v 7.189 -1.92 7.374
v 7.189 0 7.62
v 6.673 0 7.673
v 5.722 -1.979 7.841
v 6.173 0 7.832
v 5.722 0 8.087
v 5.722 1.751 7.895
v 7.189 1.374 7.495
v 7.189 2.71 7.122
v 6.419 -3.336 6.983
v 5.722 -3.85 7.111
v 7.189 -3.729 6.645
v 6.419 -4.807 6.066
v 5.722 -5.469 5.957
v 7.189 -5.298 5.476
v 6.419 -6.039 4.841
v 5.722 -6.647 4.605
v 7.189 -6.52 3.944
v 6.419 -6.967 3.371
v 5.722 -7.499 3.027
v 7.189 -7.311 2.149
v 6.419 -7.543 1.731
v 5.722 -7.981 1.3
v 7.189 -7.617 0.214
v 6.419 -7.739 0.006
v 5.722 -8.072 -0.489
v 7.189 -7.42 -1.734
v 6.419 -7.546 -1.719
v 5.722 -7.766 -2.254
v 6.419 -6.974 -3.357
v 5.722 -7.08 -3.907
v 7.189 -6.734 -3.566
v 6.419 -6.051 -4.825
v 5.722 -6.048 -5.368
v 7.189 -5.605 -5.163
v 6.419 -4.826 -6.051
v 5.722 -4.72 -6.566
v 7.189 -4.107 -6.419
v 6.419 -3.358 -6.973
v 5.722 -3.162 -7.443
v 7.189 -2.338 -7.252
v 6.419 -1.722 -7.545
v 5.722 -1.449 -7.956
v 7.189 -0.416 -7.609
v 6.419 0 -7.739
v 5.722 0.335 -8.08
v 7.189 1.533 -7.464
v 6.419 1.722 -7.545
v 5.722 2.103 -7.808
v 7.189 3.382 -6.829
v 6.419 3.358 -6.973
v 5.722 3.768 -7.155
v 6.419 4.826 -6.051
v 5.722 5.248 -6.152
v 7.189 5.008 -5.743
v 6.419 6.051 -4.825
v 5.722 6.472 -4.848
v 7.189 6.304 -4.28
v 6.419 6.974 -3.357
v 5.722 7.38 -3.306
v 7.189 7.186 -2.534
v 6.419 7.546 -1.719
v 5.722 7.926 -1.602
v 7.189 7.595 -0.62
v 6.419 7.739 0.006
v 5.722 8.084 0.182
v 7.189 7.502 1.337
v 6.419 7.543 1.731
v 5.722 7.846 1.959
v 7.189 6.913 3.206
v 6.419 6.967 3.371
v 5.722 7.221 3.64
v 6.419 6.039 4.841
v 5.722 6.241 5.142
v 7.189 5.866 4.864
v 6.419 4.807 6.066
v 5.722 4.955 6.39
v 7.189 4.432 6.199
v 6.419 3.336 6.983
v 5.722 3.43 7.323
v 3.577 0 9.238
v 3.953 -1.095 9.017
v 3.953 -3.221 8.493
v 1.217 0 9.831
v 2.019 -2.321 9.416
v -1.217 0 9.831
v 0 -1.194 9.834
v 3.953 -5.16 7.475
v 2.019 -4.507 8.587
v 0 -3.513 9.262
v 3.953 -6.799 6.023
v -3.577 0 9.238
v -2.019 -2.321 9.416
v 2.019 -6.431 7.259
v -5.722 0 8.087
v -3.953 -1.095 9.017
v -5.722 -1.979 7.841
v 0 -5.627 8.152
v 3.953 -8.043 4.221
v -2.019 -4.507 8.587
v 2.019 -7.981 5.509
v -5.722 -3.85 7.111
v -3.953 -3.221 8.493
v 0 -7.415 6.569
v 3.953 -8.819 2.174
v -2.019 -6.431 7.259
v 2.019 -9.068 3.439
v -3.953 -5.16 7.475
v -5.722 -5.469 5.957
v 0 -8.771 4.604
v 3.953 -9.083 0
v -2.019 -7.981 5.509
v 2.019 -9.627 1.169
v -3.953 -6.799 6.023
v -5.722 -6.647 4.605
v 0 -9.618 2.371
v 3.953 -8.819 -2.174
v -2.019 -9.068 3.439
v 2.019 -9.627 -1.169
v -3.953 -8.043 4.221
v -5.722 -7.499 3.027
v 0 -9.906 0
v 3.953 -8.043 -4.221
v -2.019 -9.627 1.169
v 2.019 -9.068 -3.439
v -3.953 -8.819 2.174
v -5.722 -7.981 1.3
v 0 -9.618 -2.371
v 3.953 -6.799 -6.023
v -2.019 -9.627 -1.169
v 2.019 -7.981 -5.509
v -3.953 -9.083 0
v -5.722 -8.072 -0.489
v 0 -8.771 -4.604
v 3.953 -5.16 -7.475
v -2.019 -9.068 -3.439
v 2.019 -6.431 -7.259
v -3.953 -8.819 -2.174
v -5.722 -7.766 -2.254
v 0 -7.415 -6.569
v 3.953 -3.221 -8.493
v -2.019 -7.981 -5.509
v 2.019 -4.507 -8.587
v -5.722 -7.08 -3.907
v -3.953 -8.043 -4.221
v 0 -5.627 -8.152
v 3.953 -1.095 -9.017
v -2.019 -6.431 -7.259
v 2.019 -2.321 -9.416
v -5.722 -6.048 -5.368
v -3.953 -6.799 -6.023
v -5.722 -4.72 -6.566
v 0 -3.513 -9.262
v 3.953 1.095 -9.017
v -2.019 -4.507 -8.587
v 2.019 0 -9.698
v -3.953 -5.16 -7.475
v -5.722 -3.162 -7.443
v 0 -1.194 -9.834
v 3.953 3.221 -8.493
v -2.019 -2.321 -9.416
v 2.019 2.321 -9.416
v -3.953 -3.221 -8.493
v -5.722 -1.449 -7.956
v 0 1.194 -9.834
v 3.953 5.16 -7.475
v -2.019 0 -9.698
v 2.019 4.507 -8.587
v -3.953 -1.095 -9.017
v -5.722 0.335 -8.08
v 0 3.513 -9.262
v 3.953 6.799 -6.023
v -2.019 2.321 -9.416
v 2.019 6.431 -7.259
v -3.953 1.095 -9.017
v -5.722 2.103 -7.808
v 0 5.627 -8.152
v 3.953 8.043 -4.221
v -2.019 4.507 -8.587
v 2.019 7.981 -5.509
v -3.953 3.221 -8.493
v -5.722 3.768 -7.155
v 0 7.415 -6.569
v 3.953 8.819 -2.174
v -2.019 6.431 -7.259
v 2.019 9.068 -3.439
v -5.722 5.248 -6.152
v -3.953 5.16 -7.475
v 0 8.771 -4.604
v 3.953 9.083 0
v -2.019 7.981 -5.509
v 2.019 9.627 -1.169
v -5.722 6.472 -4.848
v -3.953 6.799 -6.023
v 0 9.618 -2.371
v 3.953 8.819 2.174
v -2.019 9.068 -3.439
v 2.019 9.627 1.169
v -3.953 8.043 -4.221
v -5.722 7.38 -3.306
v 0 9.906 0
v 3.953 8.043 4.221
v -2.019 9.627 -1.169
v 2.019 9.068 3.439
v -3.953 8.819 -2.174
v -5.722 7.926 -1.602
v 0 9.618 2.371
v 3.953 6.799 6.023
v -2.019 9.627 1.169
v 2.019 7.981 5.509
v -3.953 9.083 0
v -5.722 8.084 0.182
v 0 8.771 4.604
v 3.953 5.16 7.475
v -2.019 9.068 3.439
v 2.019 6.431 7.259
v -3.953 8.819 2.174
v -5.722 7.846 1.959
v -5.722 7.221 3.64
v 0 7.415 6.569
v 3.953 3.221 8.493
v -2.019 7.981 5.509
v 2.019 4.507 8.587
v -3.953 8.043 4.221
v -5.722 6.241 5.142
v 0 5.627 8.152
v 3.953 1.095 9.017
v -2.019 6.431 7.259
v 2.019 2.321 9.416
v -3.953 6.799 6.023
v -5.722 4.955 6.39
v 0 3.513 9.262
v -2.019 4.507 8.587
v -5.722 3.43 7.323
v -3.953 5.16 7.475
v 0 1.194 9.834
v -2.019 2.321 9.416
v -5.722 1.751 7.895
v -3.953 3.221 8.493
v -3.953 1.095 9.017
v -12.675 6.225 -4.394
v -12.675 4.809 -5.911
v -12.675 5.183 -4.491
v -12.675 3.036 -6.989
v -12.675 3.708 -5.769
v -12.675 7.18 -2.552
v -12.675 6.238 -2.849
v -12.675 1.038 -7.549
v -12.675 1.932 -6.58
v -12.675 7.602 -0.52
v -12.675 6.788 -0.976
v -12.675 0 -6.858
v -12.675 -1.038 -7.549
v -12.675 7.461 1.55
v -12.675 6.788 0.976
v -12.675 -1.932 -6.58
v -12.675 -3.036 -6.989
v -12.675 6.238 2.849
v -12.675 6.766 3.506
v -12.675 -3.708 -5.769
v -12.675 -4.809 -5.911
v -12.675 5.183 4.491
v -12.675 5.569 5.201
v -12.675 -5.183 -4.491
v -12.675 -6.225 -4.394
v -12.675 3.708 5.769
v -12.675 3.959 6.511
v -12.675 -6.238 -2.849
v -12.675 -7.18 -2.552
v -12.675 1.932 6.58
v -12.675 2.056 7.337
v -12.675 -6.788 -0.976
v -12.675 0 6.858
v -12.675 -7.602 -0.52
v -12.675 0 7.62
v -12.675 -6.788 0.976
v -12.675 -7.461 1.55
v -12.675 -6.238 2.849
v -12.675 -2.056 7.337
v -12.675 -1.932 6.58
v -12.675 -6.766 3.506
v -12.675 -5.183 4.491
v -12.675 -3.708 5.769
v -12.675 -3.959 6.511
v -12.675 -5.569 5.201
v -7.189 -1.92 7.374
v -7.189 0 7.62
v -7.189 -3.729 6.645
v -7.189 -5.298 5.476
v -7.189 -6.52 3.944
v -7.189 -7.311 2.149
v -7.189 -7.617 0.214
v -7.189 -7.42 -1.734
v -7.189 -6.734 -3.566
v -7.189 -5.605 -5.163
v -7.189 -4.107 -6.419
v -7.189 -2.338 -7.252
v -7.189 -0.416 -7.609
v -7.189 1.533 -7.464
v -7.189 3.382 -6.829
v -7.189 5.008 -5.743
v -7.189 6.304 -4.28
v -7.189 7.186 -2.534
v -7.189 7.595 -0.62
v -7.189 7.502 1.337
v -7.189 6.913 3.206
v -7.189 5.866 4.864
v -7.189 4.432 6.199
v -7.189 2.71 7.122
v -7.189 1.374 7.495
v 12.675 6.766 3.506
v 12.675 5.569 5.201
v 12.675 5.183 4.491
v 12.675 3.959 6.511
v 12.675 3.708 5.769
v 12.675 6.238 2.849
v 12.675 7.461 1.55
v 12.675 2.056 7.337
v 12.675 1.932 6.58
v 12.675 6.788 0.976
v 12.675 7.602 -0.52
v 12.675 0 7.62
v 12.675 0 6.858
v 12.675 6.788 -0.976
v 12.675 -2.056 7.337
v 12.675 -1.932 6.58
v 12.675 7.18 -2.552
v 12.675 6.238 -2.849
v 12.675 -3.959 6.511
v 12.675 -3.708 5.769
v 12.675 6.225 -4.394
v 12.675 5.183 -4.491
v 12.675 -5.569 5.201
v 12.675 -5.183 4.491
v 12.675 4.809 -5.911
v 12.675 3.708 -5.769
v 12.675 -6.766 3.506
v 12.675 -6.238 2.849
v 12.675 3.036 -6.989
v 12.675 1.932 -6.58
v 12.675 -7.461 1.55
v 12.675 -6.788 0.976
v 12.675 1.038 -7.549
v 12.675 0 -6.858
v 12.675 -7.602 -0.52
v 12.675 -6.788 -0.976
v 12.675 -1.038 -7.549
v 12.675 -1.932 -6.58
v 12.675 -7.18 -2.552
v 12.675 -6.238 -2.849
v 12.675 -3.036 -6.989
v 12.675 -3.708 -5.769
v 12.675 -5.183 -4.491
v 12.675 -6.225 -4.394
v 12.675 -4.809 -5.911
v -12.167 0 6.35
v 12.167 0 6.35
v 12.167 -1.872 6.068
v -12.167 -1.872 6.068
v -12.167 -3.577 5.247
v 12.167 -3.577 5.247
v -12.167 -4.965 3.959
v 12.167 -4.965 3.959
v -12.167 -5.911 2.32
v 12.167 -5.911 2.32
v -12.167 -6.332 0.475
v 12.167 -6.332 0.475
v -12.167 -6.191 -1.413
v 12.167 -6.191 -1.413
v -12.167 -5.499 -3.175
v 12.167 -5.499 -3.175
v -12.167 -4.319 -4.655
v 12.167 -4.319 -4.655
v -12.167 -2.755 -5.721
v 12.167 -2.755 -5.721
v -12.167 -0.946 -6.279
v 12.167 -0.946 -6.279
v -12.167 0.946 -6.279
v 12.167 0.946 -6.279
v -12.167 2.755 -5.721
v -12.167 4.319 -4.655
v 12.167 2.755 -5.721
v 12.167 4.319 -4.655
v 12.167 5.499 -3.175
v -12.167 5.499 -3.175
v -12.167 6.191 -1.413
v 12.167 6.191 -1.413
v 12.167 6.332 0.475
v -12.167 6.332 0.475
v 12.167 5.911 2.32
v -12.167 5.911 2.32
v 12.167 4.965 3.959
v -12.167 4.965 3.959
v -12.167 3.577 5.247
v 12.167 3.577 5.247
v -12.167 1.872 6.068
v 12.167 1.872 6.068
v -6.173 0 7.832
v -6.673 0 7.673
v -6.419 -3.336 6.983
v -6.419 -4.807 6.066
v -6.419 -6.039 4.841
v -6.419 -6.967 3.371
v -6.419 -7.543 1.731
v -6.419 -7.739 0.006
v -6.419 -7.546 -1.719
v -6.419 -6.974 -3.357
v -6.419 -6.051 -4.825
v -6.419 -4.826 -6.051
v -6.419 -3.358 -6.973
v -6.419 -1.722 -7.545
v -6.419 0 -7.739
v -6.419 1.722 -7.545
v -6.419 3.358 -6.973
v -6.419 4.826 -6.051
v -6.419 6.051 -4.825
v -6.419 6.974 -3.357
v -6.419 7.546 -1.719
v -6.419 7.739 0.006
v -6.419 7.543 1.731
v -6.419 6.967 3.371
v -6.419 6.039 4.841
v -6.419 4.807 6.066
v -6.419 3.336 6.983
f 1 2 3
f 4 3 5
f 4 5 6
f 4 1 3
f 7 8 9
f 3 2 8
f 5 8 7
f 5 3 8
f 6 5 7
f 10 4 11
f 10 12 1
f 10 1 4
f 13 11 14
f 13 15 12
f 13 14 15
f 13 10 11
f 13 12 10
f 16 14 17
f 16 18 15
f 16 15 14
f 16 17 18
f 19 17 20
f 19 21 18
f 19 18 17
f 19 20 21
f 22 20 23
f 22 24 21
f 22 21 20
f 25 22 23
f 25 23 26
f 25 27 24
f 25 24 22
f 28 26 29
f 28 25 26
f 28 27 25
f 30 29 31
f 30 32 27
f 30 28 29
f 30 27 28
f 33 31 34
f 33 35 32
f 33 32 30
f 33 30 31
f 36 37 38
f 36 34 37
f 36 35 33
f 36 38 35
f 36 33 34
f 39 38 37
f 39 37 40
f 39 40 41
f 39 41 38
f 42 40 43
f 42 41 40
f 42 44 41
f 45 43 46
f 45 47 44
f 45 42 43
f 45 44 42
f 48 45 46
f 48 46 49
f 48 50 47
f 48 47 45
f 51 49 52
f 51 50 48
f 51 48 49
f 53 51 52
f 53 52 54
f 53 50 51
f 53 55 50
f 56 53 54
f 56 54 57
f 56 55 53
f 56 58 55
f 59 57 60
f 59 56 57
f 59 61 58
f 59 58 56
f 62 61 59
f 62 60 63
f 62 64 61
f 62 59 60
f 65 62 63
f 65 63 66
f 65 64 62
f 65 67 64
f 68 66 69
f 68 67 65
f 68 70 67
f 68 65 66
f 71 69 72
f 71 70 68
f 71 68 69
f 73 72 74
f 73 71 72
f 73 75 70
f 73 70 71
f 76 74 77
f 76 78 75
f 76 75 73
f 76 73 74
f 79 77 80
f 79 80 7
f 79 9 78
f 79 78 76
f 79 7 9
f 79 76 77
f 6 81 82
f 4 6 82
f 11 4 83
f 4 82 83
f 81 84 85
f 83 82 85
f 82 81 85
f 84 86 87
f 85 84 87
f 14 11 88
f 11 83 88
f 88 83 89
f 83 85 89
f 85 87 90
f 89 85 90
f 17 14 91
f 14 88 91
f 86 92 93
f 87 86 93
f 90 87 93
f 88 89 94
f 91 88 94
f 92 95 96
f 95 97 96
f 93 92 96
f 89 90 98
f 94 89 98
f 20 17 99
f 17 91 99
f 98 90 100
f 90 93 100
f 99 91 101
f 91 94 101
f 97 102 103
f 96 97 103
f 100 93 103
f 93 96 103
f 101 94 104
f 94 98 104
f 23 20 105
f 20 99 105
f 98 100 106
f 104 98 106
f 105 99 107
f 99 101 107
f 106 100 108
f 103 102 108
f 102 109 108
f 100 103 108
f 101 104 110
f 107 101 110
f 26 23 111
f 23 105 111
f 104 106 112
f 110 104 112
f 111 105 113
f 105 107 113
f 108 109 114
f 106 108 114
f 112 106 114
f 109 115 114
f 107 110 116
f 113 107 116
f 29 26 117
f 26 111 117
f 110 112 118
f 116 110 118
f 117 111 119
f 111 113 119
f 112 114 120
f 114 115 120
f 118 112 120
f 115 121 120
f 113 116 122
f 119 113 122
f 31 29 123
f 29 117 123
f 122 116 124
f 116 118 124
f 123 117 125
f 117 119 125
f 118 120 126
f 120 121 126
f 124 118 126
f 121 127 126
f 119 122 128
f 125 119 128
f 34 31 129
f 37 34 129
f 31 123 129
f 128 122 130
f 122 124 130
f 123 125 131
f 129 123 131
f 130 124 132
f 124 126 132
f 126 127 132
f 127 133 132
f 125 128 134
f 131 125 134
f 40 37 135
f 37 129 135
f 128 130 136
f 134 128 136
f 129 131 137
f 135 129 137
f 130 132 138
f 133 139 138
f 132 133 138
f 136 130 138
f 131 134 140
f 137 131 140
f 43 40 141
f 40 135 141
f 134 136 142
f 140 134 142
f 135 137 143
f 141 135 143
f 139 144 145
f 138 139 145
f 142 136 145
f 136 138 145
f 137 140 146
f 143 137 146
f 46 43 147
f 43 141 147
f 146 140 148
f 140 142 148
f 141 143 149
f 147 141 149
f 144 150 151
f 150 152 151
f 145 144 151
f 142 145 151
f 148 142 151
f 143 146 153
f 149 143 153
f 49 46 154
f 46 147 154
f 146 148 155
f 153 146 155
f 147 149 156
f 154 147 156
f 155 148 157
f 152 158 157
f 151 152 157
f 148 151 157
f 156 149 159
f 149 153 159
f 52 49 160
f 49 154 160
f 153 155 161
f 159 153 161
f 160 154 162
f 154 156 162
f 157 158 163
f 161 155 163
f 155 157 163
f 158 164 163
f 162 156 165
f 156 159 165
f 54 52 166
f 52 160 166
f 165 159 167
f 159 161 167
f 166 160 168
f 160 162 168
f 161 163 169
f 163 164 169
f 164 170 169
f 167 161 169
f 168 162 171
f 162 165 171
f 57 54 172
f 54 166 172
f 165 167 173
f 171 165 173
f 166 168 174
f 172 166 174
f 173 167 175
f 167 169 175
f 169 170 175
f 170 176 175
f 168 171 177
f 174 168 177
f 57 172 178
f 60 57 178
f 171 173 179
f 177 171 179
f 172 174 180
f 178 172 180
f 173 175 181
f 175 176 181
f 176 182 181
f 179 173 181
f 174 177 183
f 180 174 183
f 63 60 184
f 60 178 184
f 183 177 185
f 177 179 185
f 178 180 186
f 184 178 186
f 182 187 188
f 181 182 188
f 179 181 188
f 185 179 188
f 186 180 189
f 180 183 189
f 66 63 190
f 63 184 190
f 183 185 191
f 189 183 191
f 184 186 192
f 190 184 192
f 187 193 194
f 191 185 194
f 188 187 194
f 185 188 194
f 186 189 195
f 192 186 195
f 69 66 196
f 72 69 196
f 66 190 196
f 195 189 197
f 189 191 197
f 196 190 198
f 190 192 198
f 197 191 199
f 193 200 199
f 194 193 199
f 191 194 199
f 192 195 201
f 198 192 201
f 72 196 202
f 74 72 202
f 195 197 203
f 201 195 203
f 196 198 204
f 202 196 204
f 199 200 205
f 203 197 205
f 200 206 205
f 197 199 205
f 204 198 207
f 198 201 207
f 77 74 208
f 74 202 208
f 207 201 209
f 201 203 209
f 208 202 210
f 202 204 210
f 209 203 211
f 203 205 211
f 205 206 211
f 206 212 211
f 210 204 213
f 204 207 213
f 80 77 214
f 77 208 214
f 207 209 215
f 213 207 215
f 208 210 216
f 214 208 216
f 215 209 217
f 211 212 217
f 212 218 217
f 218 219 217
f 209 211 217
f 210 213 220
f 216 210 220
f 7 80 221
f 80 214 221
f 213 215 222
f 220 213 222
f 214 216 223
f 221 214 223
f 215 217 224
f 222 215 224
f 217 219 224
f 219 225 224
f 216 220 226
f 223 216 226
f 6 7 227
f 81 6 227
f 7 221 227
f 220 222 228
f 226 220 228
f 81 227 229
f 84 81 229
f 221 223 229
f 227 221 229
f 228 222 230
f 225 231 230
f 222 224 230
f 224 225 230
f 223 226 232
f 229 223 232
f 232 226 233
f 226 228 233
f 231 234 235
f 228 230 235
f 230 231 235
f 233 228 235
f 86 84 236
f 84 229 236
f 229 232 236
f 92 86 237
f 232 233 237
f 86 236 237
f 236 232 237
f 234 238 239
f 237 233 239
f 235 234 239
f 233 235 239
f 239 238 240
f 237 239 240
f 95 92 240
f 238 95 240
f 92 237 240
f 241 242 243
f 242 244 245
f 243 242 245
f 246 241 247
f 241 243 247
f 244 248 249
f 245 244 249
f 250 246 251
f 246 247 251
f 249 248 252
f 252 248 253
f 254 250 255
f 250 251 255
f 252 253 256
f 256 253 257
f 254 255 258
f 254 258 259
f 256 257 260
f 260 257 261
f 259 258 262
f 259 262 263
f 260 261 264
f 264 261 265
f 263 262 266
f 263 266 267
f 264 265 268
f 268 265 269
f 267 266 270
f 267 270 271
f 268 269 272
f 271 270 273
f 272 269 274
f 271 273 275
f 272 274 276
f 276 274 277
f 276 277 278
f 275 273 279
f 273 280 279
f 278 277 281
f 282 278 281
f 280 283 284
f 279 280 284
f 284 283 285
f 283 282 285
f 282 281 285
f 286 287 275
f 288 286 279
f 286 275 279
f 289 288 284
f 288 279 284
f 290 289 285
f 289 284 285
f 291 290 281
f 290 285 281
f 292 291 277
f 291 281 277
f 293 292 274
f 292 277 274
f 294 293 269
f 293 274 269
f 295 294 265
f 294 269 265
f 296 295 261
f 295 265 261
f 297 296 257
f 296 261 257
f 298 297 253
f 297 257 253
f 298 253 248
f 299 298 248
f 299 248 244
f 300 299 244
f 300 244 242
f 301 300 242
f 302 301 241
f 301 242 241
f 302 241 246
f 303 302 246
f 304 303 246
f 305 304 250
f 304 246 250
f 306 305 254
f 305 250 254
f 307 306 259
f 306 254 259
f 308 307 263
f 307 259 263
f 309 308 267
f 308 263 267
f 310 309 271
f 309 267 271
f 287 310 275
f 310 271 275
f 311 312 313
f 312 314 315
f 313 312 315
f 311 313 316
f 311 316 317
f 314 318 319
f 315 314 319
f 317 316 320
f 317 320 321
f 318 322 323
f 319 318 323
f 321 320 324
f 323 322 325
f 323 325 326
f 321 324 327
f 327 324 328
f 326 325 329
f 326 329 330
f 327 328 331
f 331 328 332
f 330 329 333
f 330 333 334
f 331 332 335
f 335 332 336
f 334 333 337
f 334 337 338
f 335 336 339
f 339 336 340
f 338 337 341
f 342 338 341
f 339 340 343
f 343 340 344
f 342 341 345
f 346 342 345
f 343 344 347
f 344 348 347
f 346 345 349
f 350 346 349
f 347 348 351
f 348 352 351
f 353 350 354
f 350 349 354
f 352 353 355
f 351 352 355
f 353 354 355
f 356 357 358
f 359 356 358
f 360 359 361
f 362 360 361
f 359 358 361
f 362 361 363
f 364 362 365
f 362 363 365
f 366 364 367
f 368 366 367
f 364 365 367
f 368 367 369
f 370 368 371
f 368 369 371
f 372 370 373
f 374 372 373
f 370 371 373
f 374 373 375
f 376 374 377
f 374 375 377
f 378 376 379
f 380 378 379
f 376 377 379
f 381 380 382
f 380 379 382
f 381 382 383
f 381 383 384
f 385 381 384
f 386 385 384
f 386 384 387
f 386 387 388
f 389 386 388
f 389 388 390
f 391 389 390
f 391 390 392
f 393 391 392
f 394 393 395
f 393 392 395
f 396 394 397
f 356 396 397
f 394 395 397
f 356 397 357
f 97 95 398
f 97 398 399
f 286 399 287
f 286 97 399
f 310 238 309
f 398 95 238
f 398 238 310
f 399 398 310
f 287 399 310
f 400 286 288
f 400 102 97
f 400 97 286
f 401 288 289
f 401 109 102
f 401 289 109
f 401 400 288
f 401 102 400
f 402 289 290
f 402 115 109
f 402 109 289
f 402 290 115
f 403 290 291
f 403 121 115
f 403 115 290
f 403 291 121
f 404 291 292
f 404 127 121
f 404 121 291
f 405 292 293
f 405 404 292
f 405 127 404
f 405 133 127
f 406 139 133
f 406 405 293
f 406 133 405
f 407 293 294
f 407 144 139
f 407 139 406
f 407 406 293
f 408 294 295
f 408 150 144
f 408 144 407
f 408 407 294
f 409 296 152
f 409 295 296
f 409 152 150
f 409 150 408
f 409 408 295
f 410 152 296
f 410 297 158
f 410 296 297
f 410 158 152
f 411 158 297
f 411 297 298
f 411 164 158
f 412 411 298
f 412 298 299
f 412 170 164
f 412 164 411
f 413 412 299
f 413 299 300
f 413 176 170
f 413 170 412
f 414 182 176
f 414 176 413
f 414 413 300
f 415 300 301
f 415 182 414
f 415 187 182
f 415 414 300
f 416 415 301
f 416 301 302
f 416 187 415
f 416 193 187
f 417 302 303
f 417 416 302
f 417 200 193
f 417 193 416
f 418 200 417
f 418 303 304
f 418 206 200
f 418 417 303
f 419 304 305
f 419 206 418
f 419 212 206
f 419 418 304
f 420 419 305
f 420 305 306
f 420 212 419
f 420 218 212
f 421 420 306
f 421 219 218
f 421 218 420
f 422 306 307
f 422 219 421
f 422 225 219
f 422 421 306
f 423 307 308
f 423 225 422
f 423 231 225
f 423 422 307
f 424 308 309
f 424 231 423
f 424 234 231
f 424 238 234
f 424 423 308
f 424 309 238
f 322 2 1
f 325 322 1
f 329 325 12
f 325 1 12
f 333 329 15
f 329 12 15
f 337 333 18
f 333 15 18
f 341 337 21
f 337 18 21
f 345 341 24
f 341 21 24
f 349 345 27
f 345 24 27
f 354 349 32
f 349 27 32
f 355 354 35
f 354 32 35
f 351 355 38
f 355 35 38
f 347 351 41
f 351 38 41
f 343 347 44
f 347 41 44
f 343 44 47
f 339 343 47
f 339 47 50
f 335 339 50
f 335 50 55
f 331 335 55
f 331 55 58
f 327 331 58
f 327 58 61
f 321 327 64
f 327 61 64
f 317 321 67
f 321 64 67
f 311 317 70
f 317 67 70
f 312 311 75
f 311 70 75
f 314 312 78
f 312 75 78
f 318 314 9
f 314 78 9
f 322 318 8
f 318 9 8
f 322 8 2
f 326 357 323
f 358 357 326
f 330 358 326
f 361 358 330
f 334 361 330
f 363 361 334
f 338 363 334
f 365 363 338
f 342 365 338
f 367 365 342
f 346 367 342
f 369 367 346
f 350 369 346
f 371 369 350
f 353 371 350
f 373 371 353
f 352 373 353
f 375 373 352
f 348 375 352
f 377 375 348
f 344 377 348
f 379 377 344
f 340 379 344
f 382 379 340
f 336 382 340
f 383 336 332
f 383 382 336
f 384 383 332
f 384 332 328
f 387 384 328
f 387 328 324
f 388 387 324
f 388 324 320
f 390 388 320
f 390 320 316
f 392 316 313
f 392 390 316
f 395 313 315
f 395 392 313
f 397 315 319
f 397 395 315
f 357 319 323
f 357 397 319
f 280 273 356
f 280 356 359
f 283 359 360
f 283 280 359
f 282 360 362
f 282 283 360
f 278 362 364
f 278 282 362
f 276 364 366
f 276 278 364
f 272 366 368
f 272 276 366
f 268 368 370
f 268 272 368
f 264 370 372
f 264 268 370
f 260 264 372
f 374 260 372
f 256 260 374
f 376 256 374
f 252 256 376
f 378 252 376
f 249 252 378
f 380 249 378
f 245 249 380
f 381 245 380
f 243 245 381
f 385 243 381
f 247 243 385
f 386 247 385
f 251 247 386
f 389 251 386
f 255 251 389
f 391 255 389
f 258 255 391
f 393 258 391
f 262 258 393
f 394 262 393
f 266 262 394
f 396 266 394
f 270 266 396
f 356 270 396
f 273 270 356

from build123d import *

# Parameters (mm, degrees)
FILLET1_R     = 2.54
CHAMFER1_SIZE = 0.508


with BuildPart() as part:
    # Sketch1 → Revolve1 (revolve)
    with BuildSketch(Plane.XY, mode=Mode.PRIVATE) as revolve1_sk:
        with BuildLine():
            Line((-12.6746, 6.35), (12.6746, 6.35))
            Line((12.6746, 6.35), (12.6746, 7.62))
            Line((12.6746, 7.62), (6.329647384, 7.62))
            ThreePointArc((6.329647384, 7.62), (0, 9.906), (-6.329647384, 7.62))
            Line((-6.329647384, 7.62), (-12.6746, 7.62))
            Line((-12.6746, 7.62), (-12.6746, 6.35))
        make_face()
    revolve(revolve1_sk.sketch.rotate(Axis((-29.740184884, 0, 0), (1, 0, 0)), 90), axis=Axis((-29.740184884, 0, 0), (1, 0, 0)))

    # Fillet1
    fillet1_edges = [part.edges().sort_by_distance(p)[0] for p in [
        (-6.329647384, 0, -7.62),
        (6.329647384, 0, -7.62),
    ]]
    fillet(fillet1_edges, radius=FILLET1_R)

    # Chamfer1
    chamfer1_edges = [part.edges().sort_by_distance(p)[0] for p in [
        (12.6746, 0, -6.35),
        (-12.6746, 0, -6.35),
    ]]
    chamfer(chamfer1_edges, length=CHAMFER1_SIZE)


solid = part.part
